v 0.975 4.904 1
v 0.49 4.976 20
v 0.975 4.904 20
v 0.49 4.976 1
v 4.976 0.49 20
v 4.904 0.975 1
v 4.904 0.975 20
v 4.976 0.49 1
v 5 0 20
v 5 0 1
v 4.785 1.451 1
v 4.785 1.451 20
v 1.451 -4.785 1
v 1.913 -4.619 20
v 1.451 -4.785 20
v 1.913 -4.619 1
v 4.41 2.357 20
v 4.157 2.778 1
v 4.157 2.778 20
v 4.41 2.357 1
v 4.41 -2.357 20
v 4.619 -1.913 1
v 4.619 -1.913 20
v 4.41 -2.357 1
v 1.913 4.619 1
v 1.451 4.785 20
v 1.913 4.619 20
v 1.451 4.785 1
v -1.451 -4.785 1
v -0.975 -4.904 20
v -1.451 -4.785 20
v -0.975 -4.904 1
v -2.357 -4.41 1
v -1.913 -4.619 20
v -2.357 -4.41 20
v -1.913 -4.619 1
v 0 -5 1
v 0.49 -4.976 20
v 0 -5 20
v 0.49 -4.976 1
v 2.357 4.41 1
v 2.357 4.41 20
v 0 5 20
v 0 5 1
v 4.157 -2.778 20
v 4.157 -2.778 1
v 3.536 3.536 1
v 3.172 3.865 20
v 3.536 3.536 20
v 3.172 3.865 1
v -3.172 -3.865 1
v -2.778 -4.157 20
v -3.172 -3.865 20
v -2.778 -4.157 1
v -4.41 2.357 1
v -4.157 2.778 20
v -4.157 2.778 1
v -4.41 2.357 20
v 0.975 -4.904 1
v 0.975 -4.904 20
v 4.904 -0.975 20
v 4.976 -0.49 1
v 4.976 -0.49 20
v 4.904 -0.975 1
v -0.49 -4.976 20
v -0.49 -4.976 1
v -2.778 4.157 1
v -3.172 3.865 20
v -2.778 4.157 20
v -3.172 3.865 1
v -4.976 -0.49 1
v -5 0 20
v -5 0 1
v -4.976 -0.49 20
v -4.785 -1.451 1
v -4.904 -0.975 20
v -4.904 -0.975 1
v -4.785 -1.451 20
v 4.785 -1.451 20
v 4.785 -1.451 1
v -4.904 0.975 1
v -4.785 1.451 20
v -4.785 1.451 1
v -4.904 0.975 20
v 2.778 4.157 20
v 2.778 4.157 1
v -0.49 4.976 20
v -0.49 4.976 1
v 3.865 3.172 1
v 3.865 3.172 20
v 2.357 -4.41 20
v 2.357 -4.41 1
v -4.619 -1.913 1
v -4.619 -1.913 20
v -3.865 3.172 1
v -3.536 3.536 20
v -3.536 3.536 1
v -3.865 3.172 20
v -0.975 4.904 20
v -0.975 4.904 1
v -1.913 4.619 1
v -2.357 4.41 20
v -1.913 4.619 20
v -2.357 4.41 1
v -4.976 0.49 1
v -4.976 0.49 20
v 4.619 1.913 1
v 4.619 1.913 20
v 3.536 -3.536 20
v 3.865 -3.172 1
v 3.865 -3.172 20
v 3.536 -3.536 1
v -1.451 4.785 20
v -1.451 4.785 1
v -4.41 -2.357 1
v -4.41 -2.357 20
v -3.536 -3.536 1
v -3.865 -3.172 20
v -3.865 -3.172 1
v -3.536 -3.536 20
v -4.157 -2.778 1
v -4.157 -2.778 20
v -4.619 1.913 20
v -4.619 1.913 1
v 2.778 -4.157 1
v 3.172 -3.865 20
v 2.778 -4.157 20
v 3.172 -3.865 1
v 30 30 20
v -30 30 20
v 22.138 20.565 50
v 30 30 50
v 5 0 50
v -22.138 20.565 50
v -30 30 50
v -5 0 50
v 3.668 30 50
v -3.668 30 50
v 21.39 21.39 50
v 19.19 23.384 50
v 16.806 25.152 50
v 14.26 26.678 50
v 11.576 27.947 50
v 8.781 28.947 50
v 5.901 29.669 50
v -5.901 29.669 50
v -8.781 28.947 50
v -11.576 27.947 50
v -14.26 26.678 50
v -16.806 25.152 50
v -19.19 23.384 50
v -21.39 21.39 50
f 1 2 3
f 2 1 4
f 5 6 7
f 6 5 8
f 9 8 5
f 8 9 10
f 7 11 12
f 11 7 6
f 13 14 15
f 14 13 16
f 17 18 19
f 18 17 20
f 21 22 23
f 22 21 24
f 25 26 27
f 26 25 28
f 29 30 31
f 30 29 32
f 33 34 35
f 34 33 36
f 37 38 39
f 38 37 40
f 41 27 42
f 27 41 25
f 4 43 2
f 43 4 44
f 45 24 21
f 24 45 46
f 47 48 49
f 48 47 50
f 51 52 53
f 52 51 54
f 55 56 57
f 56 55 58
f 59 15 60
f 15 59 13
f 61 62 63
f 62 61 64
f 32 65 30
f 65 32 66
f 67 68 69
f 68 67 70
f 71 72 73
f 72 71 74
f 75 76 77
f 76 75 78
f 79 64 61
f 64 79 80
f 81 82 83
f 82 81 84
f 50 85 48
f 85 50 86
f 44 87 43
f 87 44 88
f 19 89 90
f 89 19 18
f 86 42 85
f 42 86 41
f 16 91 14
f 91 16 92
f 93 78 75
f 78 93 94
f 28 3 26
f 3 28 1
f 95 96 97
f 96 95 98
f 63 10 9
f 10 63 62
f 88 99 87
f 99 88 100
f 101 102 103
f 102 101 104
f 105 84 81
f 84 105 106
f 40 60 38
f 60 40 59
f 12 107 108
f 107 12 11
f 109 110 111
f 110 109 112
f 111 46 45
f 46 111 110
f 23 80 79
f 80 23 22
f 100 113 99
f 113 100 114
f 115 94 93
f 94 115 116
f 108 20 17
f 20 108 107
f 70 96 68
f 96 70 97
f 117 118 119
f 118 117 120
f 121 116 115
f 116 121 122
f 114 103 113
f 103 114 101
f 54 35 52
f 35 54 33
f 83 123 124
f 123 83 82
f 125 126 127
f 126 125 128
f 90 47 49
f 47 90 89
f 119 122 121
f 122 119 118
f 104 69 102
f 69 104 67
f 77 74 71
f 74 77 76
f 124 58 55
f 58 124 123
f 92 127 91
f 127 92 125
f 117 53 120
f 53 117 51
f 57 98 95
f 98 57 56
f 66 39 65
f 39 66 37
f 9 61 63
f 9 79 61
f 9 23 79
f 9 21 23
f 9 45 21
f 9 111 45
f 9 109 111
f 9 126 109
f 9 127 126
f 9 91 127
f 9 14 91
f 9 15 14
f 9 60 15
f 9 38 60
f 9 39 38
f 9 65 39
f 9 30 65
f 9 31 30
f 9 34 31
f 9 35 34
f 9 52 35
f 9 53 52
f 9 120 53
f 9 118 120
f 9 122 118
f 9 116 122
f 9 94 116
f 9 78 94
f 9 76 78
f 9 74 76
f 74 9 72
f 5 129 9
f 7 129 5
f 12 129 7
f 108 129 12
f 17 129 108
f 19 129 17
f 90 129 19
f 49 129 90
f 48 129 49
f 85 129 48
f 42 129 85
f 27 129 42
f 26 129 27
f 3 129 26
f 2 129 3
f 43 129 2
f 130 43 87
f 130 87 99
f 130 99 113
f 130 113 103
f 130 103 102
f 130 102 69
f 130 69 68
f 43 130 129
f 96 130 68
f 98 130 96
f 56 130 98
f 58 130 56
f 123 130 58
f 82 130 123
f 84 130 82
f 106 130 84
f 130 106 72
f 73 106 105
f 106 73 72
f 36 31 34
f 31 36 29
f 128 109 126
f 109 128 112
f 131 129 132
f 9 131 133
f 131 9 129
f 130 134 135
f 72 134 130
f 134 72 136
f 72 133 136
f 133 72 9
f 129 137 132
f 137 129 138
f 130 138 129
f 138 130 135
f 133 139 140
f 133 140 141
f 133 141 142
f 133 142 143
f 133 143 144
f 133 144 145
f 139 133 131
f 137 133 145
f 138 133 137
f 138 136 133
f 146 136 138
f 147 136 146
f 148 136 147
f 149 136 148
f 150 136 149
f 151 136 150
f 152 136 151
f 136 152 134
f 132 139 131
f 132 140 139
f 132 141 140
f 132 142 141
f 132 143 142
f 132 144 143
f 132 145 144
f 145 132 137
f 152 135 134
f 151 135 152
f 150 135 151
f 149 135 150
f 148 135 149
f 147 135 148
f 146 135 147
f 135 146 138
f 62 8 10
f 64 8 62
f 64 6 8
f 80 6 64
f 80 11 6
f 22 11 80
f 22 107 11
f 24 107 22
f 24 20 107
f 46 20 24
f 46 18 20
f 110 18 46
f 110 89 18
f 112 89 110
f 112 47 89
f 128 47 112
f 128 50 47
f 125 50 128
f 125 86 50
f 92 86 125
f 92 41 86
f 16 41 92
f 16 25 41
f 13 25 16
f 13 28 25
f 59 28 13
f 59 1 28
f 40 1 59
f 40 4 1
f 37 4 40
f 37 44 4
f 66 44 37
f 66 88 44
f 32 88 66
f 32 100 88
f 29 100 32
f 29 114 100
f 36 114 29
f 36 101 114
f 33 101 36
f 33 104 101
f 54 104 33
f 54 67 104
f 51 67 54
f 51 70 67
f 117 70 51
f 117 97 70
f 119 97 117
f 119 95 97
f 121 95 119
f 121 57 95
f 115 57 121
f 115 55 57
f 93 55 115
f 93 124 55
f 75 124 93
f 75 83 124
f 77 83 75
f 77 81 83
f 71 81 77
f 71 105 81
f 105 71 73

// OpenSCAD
// Lab Funnel - A straight spout tube with a conical funnel body, open at top and bottom.
// Printed upright with the wide opening at the top.
// Corrected to start at z=0 and have a fully open bottom.

// Dimensions
spout_od    = 10;      // Outer diameter of straight spout
spout_id    = 6.8;     // Inner diameter of straight spout (10 - 2*1.6)
spout_len   = 20;      // Length of straight spout (z=0 to z=20)
funnel_start_od = 10;  // Outer diameter at start of cone (z=20)
funnel_end_od  = 60;   // Outer diameter at rim (z=50)
funnel_len    = 30;    // Length of cone section (50 - 20)
wall_thick    = 1.6;   // Wall thickness everywhere

// Derived dimensions
funnel_start_id = funnel_start_od - 2 * wall_thick; // 6.8
funnel_end_id   = funnel_end_od - 2 * wall_thick;  // 52.8

$fn = 64;

// Build the solid part
difference() {
    union() {
        // 1. Straight Spout (Tube)
        // Outer cylinder
        translate([0, 0, 0]) 
            cylinder(h = spout_len, d = spout_od);
        
        // Inner cylinder (hole)
        translate([0, 0, 0]) 
            cylinder(h = spout_len, d = spout_id);

        // 2. Conical Funnel Body
        // Outer cone
        translate([0, 0, spout_len]) 
            linear_extrude(height = funnel_len) 
                polygon([
                    [spout_od / 2, 0],
                    [funnel_end_od / 2, funnel_len],
                    [-funnel_end_od / 2, funnel_len],
                    [-spout_od / 2, 0]
                ]);
        
        // Inner cone (hole)
        translate([0, 0, spout_len]) 
            linear_extrude(height = funnel_len) 
                polygon([
                    [spout_id / 2, 0],
                    [funnel_end_id / 2, funnel_len],
                    [-funnel_end_id / 2, funnel_len],
                    [-spout_id / 2, 0]
                ]);
    }
    
    // Cut the top opening (rim)
    // Extend slightly past the rim to ensure clean cut
    translate([0, 0, spout_len + funnel_len]) 
        cylinder(h = 2, d = funnel_end_od + 0.5);
    
    // Cut the bottom opening (spout tip)
    // The solid base is now 2mm thick (from z=0 to z=2).
    // We cut from z=-2 down to z=1 to ensure we clear the base.
    translate([0, 0, -2]) 
        cylinder(h = 3, d = spout_od + 0.5);
}
